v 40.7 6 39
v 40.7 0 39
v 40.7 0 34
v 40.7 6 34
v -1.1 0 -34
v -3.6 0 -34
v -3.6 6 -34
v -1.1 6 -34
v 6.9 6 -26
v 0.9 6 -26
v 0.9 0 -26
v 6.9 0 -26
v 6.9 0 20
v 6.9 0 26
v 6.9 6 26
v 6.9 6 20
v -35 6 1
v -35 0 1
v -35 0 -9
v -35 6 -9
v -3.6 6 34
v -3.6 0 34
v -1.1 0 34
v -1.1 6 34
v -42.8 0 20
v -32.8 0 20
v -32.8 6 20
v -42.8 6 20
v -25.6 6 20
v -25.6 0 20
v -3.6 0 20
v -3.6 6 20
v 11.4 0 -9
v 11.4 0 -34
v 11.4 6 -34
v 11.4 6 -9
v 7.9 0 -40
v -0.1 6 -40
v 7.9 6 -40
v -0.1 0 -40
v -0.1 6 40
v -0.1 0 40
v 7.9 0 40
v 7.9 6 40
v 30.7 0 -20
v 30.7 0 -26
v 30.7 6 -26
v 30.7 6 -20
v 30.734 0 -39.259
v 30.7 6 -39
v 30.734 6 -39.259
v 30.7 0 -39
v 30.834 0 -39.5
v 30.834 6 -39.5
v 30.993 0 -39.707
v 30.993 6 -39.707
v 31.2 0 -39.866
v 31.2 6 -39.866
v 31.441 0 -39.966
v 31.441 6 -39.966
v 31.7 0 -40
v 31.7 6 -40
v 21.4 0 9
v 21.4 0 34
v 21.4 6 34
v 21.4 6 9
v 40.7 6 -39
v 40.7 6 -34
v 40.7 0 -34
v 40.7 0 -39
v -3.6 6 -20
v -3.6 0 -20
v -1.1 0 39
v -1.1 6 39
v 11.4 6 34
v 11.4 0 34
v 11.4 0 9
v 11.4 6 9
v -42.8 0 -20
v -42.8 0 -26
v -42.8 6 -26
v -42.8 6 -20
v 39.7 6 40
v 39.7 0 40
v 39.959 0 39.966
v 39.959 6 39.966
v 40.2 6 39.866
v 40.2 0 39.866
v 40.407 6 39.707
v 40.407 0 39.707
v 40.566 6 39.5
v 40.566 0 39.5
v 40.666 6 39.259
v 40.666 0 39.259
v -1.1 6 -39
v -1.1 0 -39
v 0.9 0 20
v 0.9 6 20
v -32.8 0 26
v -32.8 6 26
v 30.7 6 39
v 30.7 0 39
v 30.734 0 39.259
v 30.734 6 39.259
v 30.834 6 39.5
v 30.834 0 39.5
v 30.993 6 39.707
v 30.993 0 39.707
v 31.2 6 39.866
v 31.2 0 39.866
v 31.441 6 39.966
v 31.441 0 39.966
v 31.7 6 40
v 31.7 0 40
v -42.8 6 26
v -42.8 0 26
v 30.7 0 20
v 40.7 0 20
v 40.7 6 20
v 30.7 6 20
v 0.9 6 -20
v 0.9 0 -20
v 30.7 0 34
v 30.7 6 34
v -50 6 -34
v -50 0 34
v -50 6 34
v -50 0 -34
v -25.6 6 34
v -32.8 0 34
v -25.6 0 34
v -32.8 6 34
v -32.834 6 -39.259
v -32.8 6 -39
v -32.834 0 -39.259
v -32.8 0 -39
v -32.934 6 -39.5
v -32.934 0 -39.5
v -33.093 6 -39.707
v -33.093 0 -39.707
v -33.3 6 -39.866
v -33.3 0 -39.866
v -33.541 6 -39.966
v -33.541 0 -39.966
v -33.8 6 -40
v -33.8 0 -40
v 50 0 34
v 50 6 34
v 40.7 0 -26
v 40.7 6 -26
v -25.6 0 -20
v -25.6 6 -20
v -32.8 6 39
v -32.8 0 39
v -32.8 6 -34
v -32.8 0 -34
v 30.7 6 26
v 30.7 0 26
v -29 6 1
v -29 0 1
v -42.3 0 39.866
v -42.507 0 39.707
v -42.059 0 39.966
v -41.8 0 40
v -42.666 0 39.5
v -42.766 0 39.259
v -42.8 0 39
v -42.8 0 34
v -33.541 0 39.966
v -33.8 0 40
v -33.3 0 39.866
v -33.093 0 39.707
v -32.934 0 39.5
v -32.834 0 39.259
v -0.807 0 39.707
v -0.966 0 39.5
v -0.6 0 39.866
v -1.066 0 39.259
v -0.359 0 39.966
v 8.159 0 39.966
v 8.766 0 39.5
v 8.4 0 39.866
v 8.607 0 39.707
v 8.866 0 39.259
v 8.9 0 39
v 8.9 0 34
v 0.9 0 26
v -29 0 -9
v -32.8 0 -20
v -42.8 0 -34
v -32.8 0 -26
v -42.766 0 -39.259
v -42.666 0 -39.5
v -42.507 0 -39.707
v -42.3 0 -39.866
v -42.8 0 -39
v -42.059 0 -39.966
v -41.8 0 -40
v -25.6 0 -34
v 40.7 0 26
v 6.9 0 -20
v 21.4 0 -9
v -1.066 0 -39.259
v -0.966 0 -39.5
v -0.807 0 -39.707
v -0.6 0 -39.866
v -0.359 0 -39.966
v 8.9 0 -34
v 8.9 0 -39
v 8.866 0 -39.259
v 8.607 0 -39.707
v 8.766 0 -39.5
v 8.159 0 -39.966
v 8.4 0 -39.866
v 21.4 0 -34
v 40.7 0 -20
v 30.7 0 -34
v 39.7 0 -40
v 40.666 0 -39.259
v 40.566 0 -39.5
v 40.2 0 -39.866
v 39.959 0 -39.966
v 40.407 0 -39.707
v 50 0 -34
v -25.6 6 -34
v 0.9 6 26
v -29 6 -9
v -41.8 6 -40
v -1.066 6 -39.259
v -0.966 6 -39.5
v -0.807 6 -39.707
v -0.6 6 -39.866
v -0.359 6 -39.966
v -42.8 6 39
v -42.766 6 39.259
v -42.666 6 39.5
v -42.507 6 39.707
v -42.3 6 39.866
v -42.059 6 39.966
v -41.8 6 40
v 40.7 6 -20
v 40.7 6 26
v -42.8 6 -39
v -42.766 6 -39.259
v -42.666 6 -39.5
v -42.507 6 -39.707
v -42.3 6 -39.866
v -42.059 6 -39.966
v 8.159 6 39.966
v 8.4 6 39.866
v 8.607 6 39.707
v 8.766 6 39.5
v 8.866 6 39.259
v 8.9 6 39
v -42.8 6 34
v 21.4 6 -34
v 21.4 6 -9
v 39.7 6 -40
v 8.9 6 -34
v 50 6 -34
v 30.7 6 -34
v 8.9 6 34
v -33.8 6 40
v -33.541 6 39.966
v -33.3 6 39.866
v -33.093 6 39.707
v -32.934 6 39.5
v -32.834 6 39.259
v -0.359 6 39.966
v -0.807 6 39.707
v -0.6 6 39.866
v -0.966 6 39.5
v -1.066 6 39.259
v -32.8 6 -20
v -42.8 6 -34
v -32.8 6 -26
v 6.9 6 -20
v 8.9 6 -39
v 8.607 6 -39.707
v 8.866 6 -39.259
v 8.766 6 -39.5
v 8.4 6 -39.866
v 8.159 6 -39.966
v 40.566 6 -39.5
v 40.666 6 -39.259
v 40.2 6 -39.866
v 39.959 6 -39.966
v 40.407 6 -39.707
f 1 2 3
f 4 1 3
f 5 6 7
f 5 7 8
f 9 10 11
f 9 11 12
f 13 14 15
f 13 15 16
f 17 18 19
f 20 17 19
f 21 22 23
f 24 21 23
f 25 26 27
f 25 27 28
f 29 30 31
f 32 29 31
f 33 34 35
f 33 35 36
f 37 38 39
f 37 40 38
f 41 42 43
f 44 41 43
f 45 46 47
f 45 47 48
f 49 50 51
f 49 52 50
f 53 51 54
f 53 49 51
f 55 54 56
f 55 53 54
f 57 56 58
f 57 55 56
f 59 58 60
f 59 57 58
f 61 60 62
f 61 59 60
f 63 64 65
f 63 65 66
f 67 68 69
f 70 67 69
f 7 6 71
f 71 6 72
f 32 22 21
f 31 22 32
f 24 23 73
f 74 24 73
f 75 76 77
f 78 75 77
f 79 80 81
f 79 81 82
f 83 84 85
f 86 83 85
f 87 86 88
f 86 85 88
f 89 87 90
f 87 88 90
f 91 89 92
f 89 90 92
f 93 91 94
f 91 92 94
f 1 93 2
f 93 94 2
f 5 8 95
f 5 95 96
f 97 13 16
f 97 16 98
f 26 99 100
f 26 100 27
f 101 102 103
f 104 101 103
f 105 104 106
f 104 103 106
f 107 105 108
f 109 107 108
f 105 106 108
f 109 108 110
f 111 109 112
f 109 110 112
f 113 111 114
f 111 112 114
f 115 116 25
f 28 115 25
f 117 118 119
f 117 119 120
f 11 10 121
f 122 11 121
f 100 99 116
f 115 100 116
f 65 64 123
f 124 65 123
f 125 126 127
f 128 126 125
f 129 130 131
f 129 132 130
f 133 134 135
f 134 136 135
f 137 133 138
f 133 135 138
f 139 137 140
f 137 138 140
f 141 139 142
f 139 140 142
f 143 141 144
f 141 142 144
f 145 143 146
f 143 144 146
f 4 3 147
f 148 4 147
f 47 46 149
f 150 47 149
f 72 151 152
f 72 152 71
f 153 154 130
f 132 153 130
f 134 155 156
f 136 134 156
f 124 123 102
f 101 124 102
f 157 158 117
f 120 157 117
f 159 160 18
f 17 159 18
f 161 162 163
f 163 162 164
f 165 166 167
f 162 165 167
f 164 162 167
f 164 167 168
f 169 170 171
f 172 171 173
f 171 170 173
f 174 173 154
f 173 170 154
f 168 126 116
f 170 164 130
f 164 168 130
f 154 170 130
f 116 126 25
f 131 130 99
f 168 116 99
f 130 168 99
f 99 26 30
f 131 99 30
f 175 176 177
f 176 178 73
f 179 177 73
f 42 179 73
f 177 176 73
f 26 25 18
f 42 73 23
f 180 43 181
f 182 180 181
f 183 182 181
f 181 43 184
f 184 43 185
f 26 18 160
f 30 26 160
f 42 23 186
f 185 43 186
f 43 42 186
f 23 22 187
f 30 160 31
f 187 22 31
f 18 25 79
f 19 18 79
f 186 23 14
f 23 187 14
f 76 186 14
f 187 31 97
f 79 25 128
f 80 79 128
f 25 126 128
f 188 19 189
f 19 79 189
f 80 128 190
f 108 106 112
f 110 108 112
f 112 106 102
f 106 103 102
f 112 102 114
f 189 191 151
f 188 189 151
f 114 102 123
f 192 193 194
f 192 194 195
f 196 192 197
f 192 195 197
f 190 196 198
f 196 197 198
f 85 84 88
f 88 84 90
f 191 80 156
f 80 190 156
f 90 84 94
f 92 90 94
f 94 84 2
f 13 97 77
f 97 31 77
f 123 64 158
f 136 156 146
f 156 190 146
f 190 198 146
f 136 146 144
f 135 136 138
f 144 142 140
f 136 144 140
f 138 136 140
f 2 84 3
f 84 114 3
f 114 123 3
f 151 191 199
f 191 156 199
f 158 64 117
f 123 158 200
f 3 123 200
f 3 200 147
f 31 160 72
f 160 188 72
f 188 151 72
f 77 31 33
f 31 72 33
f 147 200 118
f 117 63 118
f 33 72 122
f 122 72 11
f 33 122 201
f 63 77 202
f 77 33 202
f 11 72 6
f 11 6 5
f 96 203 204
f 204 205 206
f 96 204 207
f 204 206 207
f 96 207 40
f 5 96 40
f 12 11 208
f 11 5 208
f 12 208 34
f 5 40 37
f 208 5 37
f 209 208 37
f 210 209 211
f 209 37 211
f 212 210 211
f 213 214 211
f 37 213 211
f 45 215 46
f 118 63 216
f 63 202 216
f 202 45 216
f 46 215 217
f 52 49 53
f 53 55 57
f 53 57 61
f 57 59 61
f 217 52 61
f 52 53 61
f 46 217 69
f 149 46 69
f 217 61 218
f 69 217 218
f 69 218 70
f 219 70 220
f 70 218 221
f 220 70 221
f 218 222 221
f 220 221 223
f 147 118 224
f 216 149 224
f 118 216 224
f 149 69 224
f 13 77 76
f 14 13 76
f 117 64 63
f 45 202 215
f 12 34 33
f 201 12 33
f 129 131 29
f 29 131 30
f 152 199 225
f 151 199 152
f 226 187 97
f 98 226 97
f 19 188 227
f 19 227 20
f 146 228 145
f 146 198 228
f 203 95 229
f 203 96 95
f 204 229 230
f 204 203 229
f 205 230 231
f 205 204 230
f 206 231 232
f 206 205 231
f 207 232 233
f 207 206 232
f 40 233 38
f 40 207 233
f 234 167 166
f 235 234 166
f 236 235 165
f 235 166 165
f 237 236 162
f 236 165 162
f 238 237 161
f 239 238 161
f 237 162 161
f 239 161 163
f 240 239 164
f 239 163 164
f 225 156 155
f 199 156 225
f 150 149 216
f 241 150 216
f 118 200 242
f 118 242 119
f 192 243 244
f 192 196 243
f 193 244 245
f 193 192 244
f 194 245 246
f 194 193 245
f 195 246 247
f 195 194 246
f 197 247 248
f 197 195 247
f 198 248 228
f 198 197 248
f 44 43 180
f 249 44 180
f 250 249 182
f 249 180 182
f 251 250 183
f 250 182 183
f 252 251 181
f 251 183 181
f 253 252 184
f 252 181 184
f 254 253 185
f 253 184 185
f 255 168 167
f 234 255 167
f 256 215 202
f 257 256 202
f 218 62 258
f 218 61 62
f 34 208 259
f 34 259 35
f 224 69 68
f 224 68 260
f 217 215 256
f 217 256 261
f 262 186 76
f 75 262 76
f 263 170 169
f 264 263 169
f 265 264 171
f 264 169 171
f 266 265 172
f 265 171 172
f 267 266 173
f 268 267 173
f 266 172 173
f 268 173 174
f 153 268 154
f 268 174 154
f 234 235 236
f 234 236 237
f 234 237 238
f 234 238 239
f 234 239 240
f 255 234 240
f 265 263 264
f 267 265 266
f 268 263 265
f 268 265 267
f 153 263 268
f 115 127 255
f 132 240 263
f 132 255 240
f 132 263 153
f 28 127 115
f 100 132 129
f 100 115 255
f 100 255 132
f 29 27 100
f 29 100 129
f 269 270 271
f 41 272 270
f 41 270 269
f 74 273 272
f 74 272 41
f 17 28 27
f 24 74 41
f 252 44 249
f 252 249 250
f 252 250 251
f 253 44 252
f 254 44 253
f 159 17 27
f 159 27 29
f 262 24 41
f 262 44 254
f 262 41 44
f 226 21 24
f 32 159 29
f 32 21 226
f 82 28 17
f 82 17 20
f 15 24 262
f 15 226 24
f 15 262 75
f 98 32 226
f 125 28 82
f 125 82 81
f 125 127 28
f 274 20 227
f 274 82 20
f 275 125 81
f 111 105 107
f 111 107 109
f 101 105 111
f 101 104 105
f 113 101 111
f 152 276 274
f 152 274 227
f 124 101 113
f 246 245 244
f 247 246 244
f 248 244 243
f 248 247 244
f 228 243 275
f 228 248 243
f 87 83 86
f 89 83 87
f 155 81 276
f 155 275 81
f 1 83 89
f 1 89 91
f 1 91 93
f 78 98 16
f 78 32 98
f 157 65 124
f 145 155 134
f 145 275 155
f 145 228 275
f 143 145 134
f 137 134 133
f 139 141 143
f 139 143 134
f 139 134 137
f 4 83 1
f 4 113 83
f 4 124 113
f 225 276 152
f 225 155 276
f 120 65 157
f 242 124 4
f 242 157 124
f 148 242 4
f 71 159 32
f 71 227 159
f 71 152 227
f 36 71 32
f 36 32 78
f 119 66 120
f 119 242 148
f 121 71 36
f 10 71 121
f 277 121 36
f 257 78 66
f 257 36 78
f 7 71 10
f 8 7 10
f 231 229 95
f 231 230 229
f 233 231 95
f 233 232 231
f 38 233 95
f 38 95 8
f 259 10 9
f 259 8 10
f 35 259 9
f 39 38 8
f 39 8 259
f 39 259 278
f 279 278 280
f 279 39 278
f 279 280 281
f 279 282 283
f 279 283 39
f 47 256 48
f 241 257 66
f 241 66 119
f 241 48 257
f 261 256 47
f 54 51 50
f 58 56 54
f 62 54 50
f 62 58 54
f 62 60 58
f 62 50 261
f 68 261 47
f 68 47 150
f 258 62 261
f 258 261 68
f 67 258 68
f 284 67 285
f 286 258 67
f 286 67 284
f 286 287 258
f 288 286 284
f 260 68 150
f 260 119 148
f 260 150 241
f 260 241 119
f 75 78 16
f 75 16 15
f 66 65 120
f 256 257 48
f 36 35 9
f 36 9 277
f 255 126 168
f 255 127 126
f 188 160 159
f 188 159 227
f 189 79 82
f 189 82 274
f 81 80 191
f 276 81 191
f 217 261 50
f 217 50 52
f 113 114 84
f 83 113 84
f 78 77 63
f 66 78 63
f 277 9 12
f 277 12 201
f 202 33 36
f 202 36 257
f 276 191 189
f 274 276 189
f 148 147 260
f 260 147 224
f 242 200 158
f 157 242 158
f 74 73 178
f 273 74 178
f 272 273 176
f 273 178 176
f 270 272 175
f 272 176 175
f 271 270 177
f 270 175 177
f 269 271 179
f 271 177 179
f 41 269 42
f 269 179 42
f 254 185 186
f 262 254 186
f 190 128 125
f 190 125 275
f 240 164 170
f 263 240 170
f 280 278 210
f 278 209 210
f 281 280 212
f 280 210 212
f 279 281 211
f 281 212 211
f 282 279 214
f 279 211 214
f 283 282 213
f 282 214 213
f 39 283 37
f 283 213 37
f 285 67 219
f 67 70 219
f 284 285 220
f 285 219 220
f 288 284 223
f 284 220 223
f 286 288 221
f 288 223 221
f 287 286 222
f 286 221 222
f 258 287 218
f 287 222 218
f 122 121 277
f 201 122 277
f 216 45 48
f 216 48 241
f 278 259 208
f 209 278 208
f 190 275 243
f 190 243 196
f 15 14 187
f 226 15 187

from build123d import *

# Parameters (mm, degrees)
SKETCH1_W                                   = 100
SKETCH1_H                                   = 68
BOSS_EXTRUDE1_DEPTH                         = 6
SKETCH2_W                                   = 10
SKETCH2_H                                   = 25
CUT_EXTRUDE1_DEPTH                          = 61.761830124
SKETCH3_W                                   = 22
SKETCH3_H                                   = 14
CUT_EXTRUDE2_DEPTH                          = 61.761830124
SKETCH234_W                                 = 10
SKETCH234_H                                 = 6
BOSS_EXTRUDE234_DEPTH                       = 6
FILLET134_R                                 = 1
SKETCH2341_W                                = 10
SKETCH2341_H                                = 6
BOSS_EXTRUDE2341_DEPTH                      = 6
FILLET1341_R                                = 1
SKETCH2342_W                                = 10
SKETCH2342_H                                = 6
BOSS_EXTRUDE2342_DEPTH                      = 6
FILLET1342_R                                = 1
SKETCH6_W                                   = 10
SKETCH6_H                                   = 6
CUT_EXTRUDE11_DEPTH                         = 105.61109994
SKETCH62_W                                  = 10
SKETCH62_H                                  = 6
CUT_EXTRUDE13_DEPTH                         = 108.583694896
CUT_EXTRUDE110_START                        = -3
SKETCH67_W                                  = 6
SKETCH67_H                                  = 6
CUT_EXTRUDE110_DEPTH                        = 6
FILLET134_OF_MIRROR2_R                      = 1
FILLET1341_OF_MIRROR2_R                     = 1
FILLET1342_OF_MIRROR2_R                     = 1
SMART_FEATURE3_VIRTUAL_PIN_51_START         = 34
SMART_FEATURE3_VIRTUAL_PIN_51_OUTLINE_W     = 10
SMART_FEATURE3_VIRTUAL_PIN_51_OUTLINE_H     = 6
SMART_FEATURE3_VIRTUAL_PIN_51_DEPTH         = 6
SMART_FEATURE3_VIRTUAL_PIN_51_START_2       = 20
SMART_FEATURE3_VIRTUAL_PIN_51_2_OUTLINE_W   = 10
SMART_FEATURE3_VIRTUAL_PIN_51_2_OUTLINE_H   = 6
SMART_FEATURE3_VIRTUAL_PIN_51_2_OUTLINE_W_2 = 6
SMART_FEATURE3_VIRTUAL_PIN_51_2_DEPTH       = 6
CUT_EXTRUDE16_START                         = -3
CUT_EXTRUDE16_OUTLINE_W                     = 6
CUT_EXTRUDE16_OUTLINE_H                     = 10
CUT_EXTRUDE16_OUTLINE_H_2                   = 6
CUT_EXTRUDE16_OUTLINE_W_2                   = 10
CUT_EXTRUDE16_DEPTH                         = 6
CUT_EXTRUDE16_2_DEPTH                       = 6


# Read off the part's stored shape, not the designer's step: Smart-Feature3<virtual_pin-51>, Cut-Extrude16
with BuildPart() as part:
    # Sketch1 → Boss-Extrude1 (new body)
    with BuildSketch(Plane(origin=(0, 0, 0), x_dir=(1, 0, 0), z_dir=(0, 1, 0))):
        Rectangle(SKETCH1_W, SKETCH1_H)
    extrude(amount=BOSS_EXTRUDE1_DEPTH)

    # Sketch2 → Cut-Extrude1 (cut, through all)
    with BuildSketch(Plane.XZ):
        with Locations((16.4, -21.5)):
            Rectangle(SKETCH2_W, SKETCH2_H)
    cut_extrude1 = extrude(amount=-CUT_EXTRUDE1_DEPTH, mode=Mode.SUBTRACT)

    # Sketch3 → Cut-Extrude2 (cut, through all)
    with BuildSketch(Plane.XZ):
        with Locations((-14.6, -27)):
            Rectangle(SKETCH3_W, SKETCH3_H)
    cut_extrude2 = extrude(amount=-CUT_EXTRUDE2_DEPTH, mode=Mode.SUBTRACT)

    # Mirror1: Cut-Extrude1, Cut-Extrude2 across plane
    add(cut_extrude1.mirror(Plane.XY), mode=Mode.SUBTRACT)
    add(cut_extrude2.mirror(Plane.XY), mode=Mode.SUBTRACT)

    # Sketch234 → Boss-Extrude234 (add)
    with BuildSketch(Plane(origin=(34.932221392, 6, -34), x_dir=(1, 0, 0), z_dir=(0, 0, -1))):
        with Locations((0.767778608, 3)):
            Rectangle(SKETCH234_W, SKETCH234_H)
    boss_extrude234 = extrude(amount=BOSS_EXTRUDE234_DEPTH)

    # Fillet134
    fillet134_edges = [part.edges().sort_by_distance(p)[0] for p in [
        (40.7, 3, -40),
        (30.7, 3, -40),
    ]]
    fillet(fillet134_edges, radius=FILLET134_R)

    # Sketch2341 → Boss-Extrude2341 (add)
    with BuildSketch(Plane(origin=(3.132221392, 6, -34), x_dir=(1, 0, 0), z_dir=(0, 0, -1))):
        with Locations((0.767778608, 3)):
            Rectangle(SKETCH2341_W, SKETCH2341_H)
    boss_extrude2341 = extrude(amount=BOSS_EXTRUDE2341_DEPTH)

    # Fillet1341
    fillet1341_edges = [part.edges().sort_by_distance(p)[0] for p in [
        (8.9, 3, -40),
        (-1.1, 3, -40),
    ]]
    fillet(fillet1341_edges, radius=FILLET1341_R)

    # Sketch2342 → Boss-Extrude2342 (add)
    with BuildSketch(Plane(origin=(-38.567778608, 6, -34), x_dir=(1, 0, 0), z_dir=(0, 0, -1))):
        with Locations((0.767778608, 3)):
            Rectangle(SKETCH2342_W, SKETCH2342_H)
    boss_extrude2342 = extrude(amount=BOSS_EXTRUDE2342_DEPTH)

    # Fillet1342
    fillet1342_edges = [part.edges().sort_by_distance(p)[0] for p in [
        (-32.8, 3, -40),
        (-42.8, 3, -40),
    ]]
    fillet(fillet1342_edges, radius=FILLET1342_R)

    # Sketch6 → Cut-Extrude11 (cut, symmetric)
    with BuildSketch(Plane(origin=(34.932221392, 3, 21), x_dir=(1, 0, 0), z_dir=(0, -1, 0))):
        with Locations((0.767778608, -44)):
            Rectangle(SKETCH6_W, SKETCH6_H)
    cut_extrude11 = extrude(amount=CUT_EXTRUDE11_DEPTH, both=True, mode=Mode.SUBTRACT)

    # Sketch62 → Cut-Extrude13 (cut, symmetric)
    with BuildSketch(Plane(origin=(-38.567778608, 3, 21), x_dir=(1, 0, 0), z_dir=(0, -1, 0))):
        with Locations((0.767778608, -44)):
            Rectangle(SKETCH62_W, SKETCH62_H)
    cut_extrude13 = extrude(amount=CUT_EXTRUDE13_DEPTH, both=True, mode=Mode.SUBTRACT)

    # Sketch67 → Cut-Extrude110 (cut)
    with BuildSketch(Plane(origin=(3.132221392, 3, 21), x_dir=(1, 0, 0), z_dir=(0, -1, 0)).offset(CUT_EXTRUDE110_START)):
        with Locations((0.767778608, -44)):
            Rectangle(SKETCH67_W, SKETCH67_H)
    cut_extrude110 = extrude(amount=CUT_EXTRUDE110_DEPTH, mode=Mode.SUBTRACT)

    # Mirror2: Boss-Extrude234, Boss-Extrude2341, Boss-Extrude2342, Cut-Extrude11, Cut-Extrude13, Cut-Extrude110 across plane
    add(boss_extrude234.mirror(Plane.XY))
    add(boss_extrude2341.mirror(Plane.XY))
    add(boss_extrude2342.mirror(Plane.XY))
    add(cut_extrude11.mirror(Plane.XY), mode=Mode.SUBTRACT)
    add(cut_extrude13.mirror(Plane.XY), mode=Mode.SUBTRACT)
    add(cut_extrude110.mirror(Plane.XY), mode=Mode.SUBTRACT)

    # Fillet134 of Mirror2
    fillet134_of_mirror2_edges = [part.edges().sort_by_distance(p)[0] for p in [
        (40.7, 3, 40),
        (30.7, 3, 40),
    ]]
    fillet(fillet134_of_mirror2_edges, radius=FILLET134_OF_MIRROR2_R)

    # Fillet1341 of Mirror2
    fillet1341_of_mirror2_edges = [part.edges().sort_by_distance(p)[0] for p in [
        (8.9, 3, 40),
        (-1.1, 3, 40),
    ]]
    fillet(fillet1341_of_mirror2_edges, radius=FILLET1341_OF_MIRROR2_R)

    # Fillet1342 of Mirror2
    fillet1342_of_mirror2_edges = [part.edges().sort_by_distance(p)[0] for p in [
        (-32.8, 3, 40),
        (-42.8, 3, 40),
    ]]
    fillet(fillet1342_of_mirror2_edges, radius=FILLET1342_OF_MIRROR2_R)

    # Smart-Feature3<virtual_pin-51> outline → Smart-Feature3<virtual_pin-51> (cut)
    with BuildSketch(Plane.XY.offset(SMART_FEATURE3_VIRTUAL_PIN_51_START)):
        with Locations((35.7, 3)):
            Rectangle(SMART_FEATURE3_VIRTUAL_PIN_51_OUTLINE_W, SMART_FEATURE3_VIRTUAL_PIN_51_OUTLINE_H)
        with Locations((3.9, 3)):
            Rectangle(SMART_FEATURE3_VIRTUAL_PIN_51_OUTLINE_W, SMART_FEATURE3_VIRTUAL_PIN_51_OUTLINE_H)
        with Locations((-37.8, 3)):
            Rectangle(SMART_FEATURE3_VIRTUAL_PIN_51_OUTLINE_W, SMART_FEATURE3_VIRTUAL_PIN_51_OUTLINE_H)
    extrude(amount=SMART_FEATURE3_VIRTUAL_PIN_51_DEPTH, mode=Mode.SUBTRACT)

    # Smart-Feature3_virtual_pin-51 2 outline → Smart-Feature3_virtual_pin-51 2 (add)
    with BuildSketch(Plane.XY.offset(SMART_FEATURE3_VIRTUAL_PIN_51_START_2)):
        with Locations((35.7, 3)):
            Rectangle(SMART_FEATURE3_VIRTUAL_PIN_51_2_OUTLINE_W, SMART_FEATURE3_VIRTUAL_PIN_51_2_OUTLINE_H)
        with Locations((3.9, 3)):
            Rectangle(SMART_FEATURE3_VIRTUAL_PIN_51_2_OUTLINE_W_2, SMART_FEATURE3_VIRTUAL_PIN_51_2_OUTLINE_H)
        with Locations((-37.8, 3)):
            Rectangle(SMART_FEATURE3_VIRTUAL_PIN_51_2_OUTLINE_W, SMART_FEATURE3_VIRTUAL_PIN_51_2_OUTLINE_H)
    extrude(amount=SMART_FEATURE3_VIRTUAL_PIN_51_2_DEPTH)

    # Cut-Extrude16 outline → Cut-Extrude16 (cut)
    with BuildSketch(Plane(origin=(-76, 3, -3.232221392), x_dir=(0, 0, -1), z_dir=(0, 1, 0)).offset(CUT_EXTRUDE16_START)):
        with Locations((-26.232221392, -111.7)):
            Rectangle(CUT_EXTRUDE16_OUTLINE_W, CUT_EXTRUDE16_OUTLINE_H)
        with Locations((-26.232221392, -38.2)):
            Rectangle(CUT_EXTRUDE16_OUTLINE_W, CUT_EXTRUDE16_OUTLINE_H)
        with Locations((-26.232221392, -79.9)):
            Rectangle(CUT_EXTRUDE16_OUTLINE_W, CUT_EXTRUDE16_OUTLINE_H_2)
        with Locations((0.767778608, -44)):
            Rectangle(CUT_EXTRUDE16_OUTLINE_W_2, CUT_EXTRUDE16_OUTLINE_H_2)
    extrude(amount=CUT_EXTRUDE16_DEPTH, mode=Mode.SUBTRACT)

    # Cut-Extrude16 2 outline → Cut-Extrude16 2 (add)
    with BuildSketch(Plane(origin=(-76, 3, -3.232221392), x_dir=(0, 0, -1), z_dir=(0, 1, 0)).offset(CUT_EXTRUDE16_START)):
        with BuildLine():
            ThreePointArc((-43.232221392, -115.7), (-42.939328173, -116.407106781), (-42.232221392, -116.7))
            Line((-42.232221392, -116.7), (-37.232221392, -116.7))
            Line((-37.232221392, -116.7), (-37.232221392, -106.7))
            Line((-37.232221392, -106.7), (-42.232221392, -106.7))
            ThreePointArc((-42.232221392, -106.7), (-42.939328173, -106.992893219), (-43.232221392, -107.7))
            Line((-43.232221392, -107.7), (-43.232221392, -115.7))
        make_face()
        with BuildLine():
            ThreePointArc((-43.232221392, -83.9), (-42.939328173, -84.607106781), (-42.232221392, -84.9))
            Line((-42.232221392, -84.9), (-37.232221392, -84.9))
            Line((-37.232221392, -84.9), (-37.232221392, -74.9))
            Line((-37.232221392, -74.9), (-42.232221392, -74.9))
            ThreePointArc((-42.232221392, -74.9), (-42.939328173, -75.192893219), (-43.232221392, -75.9))
            Line((-43.232221392, -75.9), (-43.232221392, -83.9))
        make_face()
        with BuildLine():
            ThreePointArc((-43.232221392, -42.2), (-42.939328173, -42.907106781), (-42.232221392, -43.2))
            Line((-42.232221392, -43.2), (-37.232221392, -43.2))
            Line((-37.232221392, -43.2), (-37.232221392, -33.2))
            Line((-37.232221392, -33.2), (-42.232221392, -33.2))
            ThreePointArc((-42.232221392, -33.2), (-42.939328173, -33.492893219), (-43.232221392, -34.2))
            Line((-43.232221392, -34.2), (-43.232221392, -42.2))
        make_face()
    extrude(amount=CUT_EXTRUDE16_2_DEPTH)


solid = part.part
